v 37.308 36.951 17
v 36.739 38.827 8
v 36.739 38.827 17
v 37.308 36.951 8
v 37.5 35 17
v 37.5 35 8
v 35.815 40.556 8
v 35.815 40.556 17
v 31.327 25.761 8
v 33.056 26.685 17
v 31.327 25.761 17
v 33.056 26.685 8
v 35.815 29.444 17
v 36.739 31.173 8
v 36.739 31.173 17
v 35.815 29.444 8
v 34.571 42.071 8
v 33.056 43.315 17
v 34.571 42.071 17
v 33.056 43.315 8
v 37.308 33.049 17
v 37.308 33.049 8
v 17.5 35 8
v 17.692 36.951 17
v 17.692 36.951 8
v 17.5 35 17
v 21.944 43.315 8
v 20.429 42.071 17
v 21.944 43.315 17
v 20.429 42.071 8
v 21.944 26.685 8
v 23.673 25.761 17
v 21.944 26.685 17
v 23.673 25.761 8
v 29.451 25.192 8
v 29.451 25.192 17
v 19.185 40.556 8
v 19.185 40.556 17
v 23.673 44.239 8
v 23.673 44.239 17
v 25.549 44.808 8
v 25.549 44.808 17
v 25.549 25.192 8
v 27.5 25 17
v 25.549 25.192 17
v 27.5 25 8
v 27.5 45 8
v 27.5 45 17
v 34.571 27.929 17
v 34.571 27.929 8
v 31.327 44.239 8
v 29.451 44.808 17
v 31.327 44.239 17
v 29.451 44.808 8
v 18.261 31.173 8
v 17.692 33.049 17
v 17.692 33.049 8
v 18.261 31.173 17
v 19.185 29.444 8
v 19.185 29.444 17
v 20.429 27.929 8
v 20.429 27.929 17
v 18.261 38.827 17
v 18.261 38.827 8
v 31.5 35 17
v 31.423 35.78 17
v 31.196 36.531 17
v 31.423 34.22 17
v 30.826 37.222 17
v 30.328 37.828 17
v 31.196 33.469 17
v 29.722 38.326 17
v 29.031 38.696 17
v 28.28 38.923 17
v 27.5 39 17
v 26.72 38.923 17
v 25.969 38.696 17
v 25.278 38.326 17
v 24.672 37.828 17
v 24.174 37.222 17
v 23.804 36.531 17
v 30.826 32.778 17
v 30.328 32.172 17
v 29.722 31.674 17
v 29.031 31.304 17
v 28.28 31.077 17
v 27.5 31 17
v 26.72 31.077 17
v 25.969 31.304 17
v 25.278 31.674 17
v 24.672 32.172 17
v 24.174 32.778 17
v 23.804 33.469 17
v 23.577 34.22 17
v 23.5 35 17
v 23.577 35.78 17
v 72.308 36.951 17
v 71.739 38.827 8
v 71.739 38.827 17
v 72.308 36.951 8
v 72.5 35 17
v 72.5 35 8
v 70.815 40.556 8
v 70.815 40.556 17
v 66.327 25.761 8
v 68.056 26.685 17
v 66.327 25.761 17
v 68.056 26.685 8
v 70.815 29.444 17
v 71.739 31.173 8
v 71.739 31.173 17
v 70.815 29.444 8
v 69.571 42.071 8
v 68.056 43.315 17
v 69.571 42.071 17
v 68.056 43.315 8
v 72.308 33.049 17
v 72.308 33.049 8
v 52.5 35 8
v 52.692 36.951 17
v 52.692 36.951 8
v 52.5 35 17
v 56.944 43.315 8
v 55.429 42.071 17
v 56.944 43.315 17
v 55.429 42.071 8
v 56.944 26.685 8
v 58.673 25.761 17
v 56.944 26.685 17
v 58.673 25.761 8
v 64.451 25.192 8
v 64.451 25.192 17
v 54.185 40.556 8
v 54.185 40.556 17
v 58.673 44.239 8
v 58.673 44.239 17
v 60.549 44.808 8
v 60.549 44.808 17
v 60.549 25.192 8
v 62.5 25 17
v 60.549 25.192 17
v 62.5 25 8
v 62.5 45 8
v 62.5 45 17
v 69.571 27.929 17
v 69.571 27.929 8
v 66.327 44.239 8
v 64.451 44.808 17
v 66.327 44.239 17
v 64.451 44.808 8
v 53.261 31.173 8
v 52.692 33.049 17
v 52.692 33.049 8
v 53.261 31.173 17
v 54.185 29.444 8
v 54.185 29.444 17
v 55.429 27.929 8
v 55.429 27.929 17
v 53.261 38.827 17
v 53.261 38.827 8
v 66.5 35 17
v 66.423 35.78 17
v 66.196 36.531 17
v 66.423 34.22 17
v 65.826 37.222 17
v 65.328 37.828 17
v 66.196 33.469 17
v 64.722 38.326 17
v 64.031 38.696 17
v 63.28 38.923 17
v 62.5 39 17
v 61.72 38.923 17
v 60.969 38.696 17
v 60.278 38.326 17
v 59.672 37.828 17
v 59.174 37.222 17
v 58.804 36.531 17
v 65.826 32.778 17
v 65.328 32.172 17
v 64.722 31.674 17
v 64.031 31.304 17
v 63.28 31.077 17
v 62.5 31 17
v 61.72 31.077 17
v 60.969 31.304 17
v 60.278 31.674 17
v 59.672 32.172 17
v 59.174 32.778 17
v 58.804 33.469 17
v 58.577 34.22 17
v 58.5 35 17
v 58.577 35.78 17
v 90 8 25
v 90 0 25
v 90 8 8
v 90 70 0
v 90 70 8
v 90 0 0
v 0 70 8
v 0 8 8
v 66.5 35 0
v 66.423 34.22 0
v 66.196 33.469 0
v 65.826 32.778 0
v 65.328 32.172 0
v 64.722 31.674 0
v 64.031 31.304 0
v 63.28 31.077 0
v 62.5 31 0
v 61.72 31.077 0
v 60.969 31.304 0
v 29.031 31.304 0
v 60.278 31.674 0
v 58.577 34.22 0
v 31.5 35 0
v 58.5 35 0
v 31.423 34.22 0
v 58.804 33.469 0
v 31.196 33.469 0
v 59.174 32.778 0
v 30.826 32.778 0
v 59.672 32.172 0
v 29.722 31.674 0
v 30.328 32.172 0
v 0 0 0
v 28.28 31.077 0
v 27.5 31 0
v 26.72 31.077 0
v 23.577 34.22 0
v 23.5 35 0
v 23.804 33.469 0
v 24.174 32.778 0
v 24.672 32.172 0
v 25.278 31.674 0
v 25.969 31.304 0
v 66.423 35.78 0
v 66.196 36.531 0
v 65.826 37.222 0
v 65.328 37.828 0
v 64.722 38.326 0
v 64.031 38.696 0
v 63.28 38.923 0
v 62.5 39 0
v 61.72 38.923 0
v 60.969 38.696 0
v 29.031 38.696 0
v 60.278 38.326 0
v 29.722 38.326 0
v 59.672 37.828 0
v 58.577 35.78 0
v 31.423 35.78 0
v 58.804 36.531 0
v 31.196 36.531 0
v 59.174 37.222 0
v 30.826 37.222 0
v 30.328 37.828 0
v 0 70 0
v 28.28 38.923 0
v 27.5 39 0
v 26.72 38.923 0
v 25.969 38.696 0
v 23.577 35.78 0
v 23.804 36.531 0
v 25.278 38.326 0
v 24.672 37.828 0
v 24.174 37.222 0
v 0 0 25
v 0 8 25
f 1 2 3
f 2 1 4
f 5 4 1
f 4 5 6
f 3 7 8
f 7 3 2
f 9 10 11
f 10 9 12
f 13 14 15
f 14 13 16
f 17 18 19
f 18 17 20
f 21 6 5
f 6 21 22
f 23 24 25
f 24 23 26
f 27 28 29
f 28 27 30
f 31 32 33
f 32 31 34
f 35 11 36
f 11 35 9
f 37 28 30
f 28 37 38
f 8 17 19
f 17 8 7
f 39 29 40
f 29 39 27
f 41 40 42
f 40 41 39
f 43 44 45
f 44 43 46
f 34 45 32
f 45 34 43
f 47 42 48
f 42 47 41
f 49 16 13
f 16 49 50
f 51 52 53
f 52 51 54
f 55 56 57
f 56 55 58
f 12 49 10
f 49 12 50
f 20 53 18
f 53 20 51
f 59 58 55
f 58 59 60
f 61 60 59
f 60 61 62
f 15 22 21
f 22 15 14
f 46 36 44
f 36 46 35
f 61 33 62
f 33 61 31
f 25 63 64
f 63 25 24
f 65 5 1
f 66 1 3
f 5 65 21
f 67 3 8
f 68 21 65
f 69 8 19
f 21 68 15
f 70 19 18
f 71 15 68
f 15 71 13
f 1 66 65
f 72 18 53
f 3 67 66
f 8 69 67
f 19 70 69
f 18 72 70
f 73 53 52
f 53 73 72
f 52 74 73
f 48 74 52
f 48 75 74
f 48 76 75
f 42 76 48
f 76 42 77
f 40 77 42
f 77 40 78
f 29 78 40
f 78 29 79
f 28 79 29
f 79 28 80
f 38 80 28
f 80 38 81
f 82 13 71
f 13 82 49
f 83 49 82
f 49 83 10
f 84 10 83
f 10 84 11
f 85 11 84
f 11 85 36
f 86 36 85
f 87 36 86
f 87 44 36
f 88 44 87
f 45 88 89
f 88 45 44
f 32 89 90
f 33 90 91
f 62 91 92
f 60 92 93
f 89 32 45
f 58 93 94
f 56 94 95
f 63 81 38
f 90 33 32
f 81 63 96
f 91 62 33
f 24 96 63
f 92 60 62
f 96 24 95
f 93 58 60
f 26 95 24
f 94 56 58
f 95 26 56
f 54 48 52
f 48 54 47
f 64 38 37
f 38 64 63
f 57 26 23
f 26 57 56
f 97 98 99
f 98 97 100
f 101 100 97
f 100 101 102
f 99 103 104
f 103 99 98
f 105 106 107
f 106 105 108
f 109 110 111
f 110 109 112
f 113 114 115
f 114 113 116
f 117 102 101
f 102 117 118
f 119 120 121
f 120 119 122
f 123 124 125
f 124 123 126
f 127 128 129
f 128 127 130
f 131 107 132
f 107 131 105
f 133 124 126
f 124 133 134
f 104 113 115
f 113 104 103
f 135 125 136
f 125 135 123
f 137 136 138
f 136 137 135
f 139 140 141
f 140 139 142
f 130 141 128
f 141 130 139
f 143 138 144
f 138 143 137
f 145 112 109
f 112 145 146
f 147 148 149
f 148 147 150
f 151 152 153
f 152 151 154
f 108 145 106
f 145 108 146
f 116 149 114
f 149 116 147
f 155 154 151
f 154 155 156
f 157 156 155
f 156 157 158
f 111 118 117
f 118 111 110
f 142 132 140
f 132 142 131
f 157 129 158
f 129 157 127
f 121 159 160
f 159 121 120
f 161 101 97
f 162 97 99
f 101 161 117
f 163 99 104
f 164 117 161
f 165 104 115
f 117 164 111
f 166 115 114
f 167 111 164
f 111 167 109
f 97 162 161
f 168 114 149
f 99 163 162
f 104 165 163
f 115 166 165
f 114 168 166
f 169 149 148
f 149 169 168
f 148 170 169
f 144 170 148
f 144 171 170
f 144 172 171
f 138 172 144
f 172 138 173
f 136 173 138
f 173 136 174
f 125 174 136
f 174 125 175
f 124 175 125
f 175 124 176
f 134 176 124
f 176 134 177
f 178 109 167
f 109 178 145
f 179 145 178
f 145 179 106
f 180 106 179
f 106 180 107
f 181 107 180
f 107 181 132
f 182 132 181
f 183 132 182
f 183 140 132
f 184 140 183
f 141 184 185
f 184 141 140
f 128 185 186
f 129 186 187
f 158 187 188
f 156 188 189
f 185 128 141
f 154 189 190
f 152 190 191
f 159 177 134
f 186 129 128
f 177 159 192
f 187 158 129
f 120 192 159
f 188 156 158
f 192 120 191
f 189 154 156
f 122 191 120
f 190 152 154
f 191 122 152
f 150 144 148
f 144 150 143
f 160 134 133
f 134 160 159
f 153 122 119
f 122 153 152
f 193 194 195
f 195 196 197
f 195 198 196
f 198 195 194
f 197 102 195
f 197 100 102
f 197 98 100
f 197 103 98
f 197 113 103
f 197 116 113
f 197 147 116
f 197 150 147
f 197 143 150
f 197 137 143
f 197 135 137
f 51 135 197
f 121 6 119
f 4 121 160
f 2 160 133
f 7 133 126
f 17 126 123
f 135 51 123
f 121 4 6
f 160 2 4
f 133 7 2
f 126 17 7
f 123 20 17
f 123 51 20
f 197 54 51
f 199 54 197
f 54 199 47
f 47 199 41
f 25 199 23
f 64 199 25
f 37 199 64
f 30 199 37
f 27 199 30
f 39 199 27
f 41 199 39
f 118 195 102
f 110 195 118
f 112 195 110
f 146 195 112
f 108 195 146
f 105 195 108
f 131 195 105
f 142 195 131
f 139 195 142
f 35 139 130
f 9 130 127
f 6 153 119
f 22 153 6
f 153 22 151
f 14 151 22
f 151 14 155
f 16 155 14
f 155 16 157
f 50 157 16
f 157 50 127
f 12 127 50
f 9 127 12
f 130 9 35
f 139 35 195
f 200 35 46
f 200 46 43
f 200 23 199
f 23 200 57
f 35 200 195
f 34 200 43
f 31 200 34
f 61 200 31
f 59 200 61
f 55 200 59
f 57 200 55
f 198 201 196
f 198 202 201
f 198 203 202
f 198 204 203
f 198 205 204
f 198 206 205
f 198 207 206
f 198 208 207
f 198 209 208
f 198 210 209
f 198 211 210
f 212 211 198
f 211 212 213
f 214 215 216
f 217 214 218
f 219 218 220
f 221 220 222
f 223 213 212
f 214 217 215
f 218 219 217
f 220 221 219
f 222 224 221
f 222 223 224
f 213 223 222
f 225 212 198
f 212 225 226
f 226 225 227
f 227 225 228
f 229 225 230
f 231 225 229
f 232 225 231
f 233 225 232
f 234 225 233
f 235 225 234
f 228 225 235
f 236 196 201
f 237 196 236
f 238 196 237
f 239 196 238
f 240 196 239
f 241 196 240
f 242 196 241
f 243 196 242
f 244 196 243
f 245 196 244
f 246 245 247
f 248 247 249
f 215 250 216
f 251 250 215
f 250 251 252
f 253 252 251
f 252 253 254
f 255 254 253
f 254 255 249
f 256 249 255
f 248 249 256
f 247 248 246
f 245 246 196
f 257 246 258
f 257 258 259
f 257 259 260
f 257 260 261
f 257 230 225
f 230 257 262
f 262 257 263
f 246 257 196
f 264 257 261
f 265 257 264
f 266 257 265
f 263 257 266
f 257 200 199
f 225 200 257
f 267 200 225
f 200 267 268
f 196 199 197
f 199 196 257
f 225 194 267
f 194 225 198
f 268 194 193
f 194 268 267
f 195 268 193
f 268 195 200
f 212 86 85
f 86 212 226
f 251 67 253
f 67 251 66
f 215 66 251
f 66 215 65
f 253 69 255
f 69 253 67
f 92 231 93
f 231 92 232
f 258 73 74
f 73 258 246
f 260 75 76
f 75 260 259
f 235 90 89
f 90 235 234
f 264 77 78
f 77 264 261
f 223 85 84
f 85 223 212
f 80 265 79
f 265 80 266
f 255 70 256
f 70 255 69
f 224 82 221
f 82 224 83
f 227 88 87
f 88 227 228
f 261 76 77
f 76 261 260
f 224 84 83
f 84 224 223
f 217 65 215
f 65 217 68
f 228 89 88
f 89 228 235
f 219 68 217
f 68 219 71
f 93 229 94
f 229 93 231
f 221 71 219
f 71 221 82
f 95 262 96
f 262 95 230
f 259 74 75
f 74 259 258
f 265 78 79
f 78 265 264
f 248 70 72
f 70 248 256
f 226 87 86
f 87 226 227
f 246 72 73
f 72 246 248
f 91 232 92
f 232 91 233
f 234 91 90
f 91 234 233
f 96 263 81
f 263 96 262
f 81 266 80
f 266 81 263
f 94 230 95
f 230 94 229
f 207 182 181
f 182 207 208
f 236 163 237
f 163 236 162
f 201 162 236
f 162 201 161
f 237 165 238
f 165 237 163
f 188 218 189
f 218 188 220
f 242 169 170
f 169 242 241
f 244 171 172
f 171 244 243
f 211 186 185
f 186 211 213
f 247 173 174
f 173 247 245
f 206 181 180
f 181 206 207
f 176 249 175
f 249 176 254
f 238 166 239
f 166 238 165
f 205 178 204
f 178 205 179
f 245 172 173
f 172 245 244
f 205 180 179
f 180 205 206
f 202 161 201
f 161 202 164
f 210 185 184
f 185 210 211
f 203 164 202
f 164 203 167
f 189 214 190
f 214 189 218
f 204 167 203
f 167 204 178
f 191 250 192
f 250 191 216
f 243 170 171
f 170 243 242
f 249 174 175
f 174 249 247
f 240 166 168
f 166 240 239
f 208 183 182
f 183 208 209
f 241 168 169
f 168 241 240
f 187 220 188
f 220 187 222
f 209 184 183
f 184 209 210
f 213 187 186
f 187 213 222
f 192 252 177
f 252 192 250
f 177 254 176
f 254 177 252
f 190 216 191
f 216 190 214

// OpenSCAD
$fn = 32;

// ----------------------------------------------------------------------
// Drill jig: fence jig
// ----------------------------------------------------------------------

// --- parameters (mm) ---
plate_l = 90;             // plate length, X
plate_w = 70;             // plate width, Y
plate_t = 8;              // plate thickness
boss_d = 20;              // guide boss diameter
boss_h = 10;              // boss height above the plate
guide_d = 8;              // guide hole diameter
boss_pitch = 35;          // boss pitch
fence_h = 18;             // fence height above the plate
fence_t = 8;              // fence thickness

n_boss = 2;  // guide bosses
boss_x0 = (plate_l - (n_boss - 1) * boss_pitch) / 2;  // first boss X
boss_top = plate_t - 1 + boss_h;  // boss crown height
fence_top = plate_t - 1 + fence_h;  // fence crown height
total_h = max([fence_top, boss_top]);  // overall height

difference() {
  union() {
  cube([plate_l, plate_w, plate_t]);
  for (i = [0 : n_boss - 1])
    translate([boss_x0 + i * boss_pitch, plate_w / 2, plate_t - 1])
      cylinder(h = boss_h, d = boss_d);
  translate([0, 0, plate_t - 1]) cube([plate_l, fence_t, fence_h]);
  }
  for (i = [0 : n_boss - 1])
    translate([boss_x0 + i * boss_pitch, plate_w / 2, -1])
      cylinder(h = plate_t + boss_h, d = guide_d);
}
